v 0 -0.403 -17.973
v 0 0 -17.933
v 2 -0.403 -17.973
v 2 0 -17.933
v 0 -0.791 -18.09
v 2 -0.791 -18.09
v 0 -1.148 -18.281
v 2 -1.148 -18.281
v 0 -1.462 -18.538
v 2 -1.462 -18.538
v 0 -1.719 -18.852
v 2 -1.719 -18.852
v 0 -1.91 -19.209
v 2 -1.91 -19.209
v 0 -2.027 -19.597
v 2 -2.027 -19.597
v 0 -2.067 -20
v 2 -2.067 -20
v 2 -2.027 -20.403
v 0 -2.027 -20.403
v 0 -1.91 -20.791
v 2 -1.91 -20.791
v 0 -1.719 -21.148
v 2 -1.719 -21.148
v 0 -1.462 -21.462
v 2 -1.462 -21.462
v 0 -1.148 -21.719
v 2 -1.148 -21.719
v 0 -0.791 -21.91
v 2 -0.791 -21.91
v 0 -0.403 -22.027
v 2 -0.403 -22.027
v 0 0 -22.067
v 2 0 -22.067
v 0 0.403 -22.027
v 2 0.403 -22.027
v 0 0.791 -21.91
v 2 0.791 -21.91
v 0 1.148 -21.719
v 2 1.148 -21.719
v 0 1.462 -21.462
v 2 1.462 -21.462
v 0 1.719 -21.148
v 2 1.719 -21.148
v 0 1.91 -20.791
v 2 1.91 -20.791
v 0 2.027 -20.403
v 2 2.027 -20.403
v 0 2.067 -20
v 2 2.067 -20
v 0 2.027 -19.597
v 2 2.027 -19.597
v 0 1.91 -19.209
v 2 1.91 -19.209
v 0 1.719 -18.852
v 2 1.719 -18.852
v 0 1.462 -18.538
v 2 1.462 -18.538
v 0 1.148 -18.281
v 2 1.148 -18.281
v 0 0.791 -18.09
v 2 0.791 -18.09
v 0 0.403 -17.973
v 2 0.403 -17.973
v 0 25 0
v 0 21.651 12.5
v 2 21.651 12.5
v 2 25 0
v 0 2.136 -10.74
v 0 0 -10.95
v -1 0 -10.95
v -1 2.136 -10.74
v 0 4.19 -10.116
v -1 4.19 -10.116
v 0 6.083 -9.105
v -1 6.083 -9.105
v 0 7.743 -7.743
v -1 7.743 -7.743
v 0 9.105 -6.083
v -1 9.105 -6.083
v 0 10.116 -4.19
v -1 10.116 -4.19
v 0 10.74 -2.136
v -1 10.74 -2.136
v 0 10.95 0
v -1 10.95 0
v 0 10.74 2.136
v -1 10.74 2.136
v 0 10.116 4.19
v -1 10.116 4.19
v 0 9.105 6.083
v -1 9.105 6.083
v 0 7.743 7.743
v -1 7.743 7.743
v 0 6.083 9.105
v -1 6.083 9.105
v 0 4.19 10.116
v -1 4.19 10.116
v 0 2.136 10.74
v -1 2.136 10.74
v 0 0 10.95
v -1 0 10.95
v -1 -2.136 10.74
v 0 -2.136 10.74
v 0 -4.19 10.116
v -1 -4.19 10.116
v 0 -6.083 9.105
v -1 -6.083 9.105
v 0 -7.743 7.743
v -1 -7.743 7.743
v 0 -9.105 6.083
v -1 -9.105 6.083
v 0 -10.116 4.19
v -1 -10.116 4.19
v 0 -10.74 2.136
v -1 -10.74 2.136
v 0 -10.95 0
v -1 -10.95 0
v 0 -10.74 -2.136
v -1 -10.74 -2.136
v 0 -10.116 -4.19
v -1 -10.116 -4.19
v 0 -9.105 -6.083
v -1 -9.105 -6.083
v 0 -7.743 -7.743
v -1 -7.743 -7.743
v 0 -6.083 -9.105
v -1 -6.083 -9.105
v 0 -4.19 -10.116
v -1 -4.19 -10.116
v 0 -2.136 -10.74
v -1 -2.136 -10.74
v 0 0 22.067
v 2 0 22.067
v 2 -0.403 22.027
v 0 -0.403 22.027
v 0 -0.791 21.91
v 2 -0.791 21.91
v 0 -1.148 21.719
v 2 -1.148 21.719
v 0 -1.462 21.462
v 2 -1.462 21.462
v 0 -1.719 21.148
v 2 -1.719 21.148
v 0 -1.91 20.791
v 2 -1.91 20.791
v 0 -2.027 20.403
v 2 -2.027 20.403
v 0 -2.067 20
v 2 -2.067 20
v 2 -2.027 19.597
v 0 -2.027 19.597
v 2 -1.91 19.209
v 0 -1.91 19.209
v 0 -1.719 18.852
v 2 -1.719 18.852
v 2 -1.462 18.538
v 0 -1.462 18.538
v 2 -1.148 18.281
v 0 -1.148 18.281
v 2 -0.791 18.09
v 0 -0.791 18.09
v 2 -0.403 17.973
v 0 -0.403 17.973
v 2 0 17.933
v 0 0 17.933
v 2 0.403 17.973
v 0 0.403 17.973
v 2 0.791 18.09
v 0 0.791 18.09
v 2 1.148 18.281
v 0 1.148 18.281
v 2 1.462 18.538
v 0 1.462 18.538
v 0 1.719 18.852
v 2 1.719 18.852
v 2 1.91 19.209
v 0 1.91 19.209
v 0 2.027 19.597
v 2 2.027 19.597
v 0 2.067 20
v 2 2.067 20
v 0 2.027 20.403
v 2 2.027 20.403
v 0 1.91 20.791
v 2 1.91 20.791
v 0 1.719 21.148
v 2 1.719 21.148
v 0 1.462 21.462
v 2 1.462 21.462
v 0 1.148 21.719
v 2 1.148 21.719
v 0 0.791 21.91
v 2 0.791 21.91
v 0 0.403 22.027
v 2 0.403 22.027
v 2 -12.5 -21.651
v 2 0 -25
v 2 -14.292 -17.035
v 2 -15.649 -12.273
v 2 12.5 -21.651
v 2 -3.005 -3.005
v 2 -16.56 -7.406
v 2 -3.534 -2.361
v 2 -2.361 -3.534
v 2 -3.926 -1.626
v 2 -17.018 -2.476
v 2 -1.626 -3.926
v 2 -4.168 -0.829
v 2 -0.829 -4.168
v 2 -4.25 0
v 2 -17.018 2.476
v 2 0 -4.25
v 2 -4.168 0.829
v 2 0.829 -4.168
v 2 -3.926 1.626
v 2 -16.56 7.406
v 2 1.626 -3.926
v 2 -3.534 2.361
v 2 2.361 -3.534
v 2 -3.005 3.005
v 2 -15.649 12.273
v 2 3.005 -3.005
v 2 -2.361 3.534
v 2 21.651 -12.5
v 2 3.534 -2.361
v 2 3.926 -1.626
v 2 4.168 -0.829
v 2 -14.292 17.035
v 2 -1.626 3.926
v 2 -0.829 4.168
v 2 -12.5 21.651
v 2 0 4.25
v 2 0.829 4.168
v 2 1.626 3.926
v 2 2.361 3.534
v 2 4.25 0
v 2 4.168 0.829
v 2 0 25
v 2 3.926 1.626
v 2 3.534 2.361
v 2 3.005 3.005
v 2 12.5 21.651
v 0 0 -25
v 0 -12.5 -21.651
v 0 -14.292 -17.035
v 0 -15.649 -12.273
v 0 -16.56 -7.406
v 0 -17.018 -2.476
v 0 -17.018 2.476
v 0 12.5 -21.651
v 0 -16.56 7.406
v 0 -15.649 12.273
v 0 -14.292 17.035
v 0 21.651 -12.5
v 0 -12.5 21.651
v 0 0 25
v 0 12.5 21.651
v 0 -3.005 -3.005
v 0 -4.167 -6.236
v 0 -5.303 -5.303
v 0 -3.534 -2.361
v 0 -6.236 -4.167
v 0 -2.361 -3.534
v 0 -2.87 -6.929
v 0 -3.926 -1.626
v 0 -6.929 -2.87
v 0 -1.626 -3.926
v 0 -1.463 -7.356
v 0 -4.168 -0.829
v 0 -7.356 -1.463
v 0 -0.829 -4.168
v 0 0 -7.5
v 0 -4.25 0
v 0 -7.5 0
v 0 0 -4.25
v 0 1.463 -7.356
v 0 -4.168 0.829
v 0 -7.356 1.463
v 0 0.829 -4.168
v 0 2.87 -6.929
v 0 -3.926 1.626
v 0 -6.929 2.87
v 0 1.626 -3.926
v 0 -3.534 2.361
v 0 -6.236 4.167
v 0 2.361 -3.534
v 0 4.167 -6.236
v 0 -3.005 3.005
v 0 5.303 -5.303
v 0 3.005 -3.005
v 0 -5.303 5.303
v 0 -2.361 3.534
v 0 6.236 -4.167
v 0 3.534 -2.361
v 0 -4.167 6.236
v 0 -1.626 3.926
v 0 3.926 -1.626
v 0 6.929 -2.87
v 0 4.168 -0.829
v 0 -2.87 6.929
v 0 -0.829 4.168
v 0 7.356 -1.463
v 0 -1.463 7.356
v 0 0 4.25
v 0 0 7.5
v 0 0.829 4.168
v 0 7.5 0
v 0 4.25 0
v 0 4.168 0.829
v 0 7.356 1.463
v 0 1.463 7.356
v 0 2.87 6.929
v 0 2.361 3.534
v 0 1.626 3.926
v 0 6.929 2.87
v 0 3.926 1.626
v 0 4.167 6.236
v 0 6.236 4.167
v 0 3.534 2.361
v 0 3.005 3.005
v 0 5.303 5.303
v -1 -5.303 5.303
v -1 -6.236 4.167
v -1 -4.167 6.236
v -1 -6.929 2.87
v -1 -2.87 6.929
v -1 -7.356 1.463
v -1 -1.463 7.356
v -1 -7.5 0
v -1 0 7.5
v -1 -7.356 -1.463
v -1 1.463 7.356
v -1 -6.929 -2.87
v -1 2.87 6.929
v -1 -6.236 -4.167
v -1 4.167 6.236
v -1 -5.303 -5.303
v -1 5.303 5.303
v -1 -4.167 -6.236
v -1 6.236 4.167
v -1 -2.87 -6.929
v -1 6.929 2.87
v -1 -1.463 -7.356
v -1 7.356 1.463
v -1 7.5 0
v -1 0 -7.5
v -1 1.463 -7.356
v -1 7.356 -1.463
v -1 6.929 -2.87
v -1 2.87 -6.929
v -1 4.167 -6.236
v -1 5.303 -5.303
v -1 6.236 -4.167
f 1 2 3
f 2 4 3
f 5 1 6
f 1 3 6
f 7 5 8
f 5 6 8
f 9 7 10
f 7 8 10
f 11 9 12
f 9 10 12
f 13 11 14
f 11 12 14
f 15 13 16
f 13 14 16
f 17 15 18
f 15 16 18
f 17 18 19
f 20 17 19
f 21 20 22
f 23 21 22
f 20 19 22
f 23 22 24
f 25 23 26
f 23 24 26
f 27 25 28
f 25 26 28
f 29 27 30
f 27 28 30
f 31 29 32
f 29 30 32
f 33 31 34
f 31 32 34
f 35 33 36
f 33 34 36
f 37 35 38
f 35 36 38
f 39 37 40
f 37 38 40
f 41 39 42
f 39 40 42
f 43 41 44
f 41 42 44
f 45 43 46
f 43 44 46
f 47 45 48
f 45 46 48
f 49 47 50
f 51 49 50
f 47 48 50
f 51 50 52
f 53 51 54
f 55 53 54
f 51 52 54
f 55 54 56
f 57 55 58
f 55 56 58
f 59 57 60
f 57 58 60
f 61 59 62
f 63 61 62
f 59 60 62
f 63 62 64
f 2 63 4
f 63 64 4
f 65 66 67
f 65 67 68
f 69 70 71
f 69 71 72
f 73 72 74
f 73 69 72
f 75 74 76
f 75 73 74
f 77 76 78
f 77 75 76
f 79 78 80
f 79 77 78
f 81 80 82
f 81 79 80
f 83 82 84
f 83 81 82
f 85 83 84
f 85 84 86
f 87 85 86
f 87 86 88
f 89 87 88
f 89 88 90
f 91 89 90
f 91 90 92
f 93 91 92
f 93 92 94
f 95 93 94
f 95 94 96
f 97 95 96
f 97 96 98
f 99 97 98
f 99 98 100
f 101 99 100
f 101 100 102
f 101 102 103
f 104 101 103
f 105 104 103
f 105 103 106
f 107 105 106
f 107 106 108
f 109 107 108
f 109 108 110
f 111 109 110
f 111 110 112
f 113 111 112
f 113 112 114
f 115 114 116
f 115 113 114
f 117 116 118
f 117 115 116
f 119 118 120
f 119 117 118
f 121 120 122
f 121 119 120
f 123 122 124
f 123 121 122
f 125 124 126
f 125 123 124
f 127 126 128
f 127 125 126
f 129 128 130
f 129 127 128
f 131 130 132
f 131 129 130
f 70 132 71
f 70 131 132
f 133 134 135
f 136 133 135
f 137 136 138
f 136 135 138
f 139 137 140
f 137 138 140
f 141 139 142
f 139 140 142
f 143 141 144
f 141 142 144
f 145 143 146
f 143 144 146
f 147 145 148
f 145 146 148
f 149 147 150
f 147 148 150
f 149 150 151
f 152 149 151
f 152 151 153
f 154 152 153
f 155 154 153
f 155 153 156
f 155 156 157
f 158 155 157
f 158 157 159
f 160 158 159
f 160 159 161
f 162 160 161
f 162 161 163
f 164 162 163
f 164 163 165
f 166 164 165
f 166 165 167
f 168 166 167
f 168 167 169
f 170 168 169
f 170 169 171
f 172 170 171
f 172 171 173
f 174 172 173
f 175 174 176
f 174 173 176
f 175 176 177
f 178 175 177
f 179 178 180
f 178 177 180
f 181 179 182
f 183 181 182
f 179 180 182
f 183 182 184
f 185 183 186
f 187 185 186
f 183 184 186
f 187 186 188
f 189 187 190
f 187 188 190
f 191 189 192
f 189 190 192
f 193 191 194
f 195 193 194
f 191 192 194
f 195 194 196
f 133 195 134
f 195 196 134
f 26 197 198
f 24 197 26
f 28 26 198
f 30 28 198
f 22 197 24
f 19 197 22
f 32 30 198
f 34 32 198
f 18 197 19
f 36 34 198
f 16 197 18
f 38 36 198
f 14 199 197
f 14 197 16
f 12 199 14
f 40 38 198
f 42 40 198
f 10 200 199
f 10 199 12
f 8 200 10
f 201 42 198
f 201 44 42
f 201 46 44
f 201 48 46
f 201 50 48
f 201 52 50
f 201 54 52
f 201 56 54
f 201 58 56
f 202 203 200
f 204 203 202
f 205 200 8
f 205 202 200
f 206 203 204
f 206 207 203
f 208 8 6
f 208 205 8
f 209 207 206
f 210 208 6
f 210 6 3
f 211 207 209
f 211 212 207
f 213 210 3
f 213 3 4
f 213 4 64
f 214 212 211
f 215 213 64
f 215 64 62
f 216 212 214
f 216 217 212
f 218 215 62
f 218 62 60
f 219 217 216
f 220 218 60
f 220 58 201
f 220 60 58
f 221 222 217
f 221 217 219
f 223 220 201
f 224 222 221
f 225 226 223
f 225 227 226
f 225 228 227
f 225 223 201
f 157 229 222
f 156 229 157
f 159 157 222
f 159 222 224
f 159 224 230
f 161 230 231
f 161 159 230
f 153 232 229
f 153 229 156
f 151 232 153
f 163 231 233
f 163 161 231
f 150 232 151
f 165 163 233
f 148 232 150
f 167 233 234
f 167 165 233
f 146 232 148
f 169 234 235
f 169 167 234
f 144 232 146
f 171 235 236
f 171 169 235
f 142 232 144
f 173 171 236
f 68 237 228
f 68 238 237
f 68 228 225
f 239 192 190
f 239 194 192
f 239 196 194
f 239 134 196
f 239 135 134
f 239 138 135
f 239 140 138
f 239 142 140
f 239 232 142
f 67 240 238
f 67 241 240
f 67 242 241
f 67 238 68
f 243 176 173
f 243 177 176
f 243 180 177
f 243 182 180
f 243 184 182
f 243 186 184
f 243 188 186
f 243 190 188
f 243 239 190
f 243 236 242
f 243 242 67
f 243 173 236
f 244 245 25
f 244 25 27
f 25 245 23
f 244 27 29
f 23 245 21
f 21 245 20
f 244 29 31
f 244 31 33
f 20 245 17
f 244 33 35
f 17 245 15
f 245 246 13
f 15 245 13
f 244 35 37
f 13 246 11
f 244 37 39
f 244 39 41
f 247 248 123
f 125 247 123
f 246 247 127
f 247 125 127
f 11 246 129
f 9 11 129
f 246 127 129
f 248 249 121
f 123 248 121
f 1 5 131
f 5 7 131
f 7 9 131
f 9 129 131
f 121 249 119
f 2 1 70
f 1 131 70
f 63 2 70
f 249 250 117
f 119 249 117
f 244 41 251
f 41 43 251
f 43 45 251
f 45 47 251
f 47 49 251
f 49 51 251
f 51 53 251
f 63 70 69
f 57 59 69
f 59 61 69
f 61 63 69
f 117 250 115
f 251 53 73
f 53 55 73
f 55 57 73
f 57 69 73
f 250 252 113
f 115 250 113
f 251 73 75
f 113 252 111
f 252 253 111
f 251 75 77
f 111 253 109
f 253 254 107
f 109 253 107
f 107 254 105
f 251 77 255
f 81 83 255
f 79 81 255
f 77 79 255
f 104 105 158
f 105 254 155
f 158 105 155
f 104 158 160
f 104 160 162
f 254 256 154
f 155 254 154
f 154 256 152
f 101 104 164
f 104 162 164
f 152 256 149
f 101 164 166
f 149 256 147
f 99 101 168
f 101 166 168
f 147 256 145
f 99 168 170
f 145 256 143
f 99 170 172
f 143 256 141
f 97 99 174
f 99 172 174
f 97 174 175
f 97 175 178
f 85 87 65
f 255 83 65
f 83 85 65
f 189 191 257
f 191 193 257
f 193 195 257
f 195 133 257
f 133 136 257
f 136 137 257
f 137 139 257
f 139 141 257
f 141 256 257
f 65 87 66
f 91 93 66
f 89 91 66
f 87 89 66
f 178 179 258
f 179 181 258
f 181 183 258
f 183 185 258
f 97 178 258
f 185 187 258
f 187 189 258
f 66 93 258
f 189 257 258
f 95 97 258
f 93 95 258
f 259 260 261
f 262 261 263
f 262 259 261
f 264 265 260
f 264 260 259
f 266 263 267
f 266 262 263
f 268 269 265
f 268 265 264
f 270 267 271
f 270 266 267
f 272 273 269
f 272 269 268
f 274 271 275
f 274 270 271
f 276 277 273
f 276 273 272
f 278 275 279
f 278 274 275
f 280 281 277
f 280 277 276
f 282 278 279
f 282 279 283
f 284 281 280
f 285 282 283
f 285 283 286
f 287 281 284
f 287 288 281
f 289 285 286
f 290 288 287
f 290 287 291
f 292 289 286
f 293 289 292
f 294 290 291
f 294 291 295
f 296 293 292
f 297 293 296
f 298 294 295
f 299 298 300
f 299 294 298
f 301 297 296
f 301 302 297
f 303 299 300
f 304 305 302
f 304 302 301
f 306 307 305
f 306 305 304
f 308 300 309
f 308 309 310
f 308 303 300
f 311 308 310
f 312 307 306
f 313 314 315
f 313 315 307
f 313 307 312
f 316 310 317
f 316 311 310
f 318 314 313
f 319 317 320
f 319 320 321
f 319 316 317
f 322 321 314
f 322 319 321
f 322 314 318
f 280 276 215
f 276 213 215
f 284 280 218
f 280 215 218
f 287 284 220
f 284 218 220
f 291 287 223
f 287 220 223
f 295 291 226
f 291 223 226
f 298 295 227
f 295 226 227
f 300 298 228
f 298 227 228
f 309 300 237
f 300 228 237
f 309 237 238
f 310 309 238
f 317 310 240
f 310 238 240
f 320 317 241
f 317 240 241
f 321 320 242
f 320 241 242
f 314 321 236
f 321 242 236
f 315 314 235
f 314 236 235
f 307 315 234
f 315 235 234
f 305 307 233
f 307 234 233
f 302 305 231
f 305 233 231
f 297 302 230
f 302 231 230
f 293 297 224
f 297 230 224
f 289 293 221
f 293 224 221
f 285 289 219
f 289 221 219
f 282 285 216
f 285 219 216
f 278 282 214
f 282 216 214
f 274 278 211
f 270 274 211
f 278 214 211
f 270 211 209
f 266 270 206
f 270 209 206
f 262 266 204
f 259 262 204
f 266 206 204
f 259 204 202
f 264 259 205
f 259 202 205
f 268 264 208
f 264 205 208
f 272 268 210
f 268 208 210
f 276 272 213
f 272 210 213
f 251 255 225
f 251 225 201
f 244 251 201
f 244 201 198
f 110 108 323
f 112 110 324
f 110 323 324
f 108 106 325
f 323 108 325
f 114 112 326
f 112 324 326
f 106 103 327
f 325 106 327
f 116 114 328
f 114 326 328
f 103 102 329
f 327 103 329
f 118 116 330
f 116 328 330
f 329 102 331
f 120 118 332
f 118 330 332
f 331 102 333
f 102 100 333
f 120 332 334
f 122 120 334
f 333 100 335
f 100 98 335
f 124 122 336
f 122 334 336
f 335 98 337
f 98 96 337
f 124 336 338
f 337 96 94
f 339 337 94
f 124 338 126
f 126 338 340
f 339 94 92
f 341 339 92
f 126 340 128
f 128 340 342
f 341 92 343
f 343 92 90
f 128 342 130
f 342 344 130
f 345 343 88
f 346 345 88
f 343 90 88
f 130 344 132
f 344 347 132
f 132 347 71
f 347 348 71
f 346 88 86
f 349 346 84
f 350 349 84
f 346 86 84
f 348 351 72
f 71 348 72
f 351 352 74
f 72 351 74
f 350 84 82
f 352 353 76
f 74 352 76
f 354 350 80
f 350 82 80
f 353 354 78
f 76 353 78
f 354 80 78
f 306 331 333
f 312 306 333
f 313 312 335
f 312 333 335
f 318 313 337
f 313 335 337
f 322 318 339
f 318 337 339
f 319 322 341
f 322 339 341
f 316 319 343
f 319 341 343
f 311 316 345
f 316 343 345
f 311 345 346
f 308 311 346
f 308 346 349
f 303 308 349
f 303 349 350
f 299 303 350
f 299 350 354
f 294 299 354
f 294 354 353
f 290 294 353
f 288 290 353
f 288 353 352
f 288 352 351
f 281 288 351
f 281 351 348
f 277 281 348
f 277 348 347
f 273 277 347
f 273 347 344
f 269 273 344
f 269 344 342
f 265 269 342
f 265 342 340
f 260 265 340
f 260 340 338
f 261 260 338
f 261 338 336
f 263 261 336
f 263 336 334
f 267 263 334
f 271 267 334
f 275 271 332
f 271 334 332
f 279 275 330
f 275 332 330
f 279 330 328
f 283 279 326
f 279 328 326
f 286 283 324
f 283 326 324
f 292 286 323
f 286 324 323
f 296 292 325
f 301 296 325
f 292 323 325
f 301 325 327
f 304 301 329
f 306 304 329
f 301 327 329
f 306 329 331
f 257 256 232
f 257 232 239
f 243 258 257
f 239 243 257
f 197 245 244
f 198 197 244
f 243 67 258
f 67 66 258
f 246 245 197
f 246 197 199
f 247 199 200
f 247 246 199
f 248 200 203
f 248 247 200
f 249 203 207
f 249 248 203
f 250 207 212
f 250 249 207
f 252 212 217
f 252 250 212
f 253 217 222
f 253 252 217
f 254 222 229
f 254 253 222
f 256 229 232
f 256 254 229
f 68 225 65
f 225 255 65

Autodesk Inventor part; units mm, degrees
ref_plane "YZ Plane" through (0, 0, 0) normal (1, 0, 0) x (0, 1, 0)
ref_plane "XZ Plane" through (0, 0, 0) normal (0, 1, 0) x (-1, 0, 0)
ref_plane "XY Plane" through (0, 0, 0) normal (0, 0, 1) x (1, 0, 0)
sketch "Esquisse1" plane through (0, 0, 0) normal (1, 0, 0) x (0, 1, 0)
  circle A0 centre (0, 0) radius 10.95
  circle A1 centre (0, 0) radius 25
  line L0 (0, 25) -> (25, 25)
  line L1 (25, 25) -> (25, 0)
  line L2 (21.6506, 12.5) -> (25, 0)
  line L3 (21.6506, 12.5) -> (12.5, 21.6506)
  line L4 (12.5, 21.6506) -> (0, 25)
  line L5 (0, 0) -> (7.9736, 0)
  line L6 (0, 0) -> (0, 6.25)
  line L7 (21.6506, -12.5) -> (25, 0)
  line L8 (21.6506, -12.5) -> (12.5, -21.6506)
  line L9 (12.5, -21.6506) -> (0, -25)
  line L10 (-21.6506, 12.5) -> (-25, 0)
  line L11 (-21.6506, 12.5) -> (-12.5, 21.6506)
  line L12 (-12.5, 21.6506) -> (0, 25)
  line L13 (-21.6506, -12.5) -> (-25, 0)
  line L14 (-21.6506, -12.5) -> (-12.5, -21.6506)
  line L15 (-12.5, -21.6506) -> (0, -25)
  line L16 (-12.5, 21.6506) -> (-12.5, -21.6506)
  arc A2 (-12.5, 21.6506) -> (-12.5, -21.6506) centre (36.4383, 0) ccw
  dimension "d0" = 21.9
  dimension "d1" = 50
extrude "Extrusion1" add sketch "Esquisse1" along normal blind 2 contours L7 L8 L9 L15 L16 L12 L4 L3 L2 | L16 A2
sketch "Esquisse7" plane through (2, 0, 0) normal (1, 0, 0) x (0, 0, -1)
  circle A0 centre (0, 0) radius 10.95
  circle A1 centre (0, 0) radius 4.25
extrude "Extrusion6" add sketch "Esquisse7" against normal blind 3
sketch "Esquisse8" plane through (0, 0, 0) normal (-1, 0, 0) x (0, 0, 1)
  line L0 (0, 0) -> (-20, 0)
  line L1 (0, 0) -> (0, 2.8662)
  point P0 (20, 0)
  dimension "d30" = 20
hole "Perçage2" at (0, 0, -20) at (0, 0, 20) direction (1, 0, 0) diameter 4.134 end through all thread size "M5x0.8" class "6H" standard "ISO Metric profile"
sketch "Esquisse9" plane through (-1, 0, 0) normal (-1, 0, 0) x (0, 0, 1)
  circle A0 centre (0, 0) radius 4.25 projected
  circle A1 centre (0, 0) radius 10.95 projected
  circle A2 centre (0, 0) radius 7.5
  dimension "d39" = 15
extrude "Extrusion7" cut sketch "Esquisse9" against normal blind 1 contours A2
properties part number "bielle côté 0"
